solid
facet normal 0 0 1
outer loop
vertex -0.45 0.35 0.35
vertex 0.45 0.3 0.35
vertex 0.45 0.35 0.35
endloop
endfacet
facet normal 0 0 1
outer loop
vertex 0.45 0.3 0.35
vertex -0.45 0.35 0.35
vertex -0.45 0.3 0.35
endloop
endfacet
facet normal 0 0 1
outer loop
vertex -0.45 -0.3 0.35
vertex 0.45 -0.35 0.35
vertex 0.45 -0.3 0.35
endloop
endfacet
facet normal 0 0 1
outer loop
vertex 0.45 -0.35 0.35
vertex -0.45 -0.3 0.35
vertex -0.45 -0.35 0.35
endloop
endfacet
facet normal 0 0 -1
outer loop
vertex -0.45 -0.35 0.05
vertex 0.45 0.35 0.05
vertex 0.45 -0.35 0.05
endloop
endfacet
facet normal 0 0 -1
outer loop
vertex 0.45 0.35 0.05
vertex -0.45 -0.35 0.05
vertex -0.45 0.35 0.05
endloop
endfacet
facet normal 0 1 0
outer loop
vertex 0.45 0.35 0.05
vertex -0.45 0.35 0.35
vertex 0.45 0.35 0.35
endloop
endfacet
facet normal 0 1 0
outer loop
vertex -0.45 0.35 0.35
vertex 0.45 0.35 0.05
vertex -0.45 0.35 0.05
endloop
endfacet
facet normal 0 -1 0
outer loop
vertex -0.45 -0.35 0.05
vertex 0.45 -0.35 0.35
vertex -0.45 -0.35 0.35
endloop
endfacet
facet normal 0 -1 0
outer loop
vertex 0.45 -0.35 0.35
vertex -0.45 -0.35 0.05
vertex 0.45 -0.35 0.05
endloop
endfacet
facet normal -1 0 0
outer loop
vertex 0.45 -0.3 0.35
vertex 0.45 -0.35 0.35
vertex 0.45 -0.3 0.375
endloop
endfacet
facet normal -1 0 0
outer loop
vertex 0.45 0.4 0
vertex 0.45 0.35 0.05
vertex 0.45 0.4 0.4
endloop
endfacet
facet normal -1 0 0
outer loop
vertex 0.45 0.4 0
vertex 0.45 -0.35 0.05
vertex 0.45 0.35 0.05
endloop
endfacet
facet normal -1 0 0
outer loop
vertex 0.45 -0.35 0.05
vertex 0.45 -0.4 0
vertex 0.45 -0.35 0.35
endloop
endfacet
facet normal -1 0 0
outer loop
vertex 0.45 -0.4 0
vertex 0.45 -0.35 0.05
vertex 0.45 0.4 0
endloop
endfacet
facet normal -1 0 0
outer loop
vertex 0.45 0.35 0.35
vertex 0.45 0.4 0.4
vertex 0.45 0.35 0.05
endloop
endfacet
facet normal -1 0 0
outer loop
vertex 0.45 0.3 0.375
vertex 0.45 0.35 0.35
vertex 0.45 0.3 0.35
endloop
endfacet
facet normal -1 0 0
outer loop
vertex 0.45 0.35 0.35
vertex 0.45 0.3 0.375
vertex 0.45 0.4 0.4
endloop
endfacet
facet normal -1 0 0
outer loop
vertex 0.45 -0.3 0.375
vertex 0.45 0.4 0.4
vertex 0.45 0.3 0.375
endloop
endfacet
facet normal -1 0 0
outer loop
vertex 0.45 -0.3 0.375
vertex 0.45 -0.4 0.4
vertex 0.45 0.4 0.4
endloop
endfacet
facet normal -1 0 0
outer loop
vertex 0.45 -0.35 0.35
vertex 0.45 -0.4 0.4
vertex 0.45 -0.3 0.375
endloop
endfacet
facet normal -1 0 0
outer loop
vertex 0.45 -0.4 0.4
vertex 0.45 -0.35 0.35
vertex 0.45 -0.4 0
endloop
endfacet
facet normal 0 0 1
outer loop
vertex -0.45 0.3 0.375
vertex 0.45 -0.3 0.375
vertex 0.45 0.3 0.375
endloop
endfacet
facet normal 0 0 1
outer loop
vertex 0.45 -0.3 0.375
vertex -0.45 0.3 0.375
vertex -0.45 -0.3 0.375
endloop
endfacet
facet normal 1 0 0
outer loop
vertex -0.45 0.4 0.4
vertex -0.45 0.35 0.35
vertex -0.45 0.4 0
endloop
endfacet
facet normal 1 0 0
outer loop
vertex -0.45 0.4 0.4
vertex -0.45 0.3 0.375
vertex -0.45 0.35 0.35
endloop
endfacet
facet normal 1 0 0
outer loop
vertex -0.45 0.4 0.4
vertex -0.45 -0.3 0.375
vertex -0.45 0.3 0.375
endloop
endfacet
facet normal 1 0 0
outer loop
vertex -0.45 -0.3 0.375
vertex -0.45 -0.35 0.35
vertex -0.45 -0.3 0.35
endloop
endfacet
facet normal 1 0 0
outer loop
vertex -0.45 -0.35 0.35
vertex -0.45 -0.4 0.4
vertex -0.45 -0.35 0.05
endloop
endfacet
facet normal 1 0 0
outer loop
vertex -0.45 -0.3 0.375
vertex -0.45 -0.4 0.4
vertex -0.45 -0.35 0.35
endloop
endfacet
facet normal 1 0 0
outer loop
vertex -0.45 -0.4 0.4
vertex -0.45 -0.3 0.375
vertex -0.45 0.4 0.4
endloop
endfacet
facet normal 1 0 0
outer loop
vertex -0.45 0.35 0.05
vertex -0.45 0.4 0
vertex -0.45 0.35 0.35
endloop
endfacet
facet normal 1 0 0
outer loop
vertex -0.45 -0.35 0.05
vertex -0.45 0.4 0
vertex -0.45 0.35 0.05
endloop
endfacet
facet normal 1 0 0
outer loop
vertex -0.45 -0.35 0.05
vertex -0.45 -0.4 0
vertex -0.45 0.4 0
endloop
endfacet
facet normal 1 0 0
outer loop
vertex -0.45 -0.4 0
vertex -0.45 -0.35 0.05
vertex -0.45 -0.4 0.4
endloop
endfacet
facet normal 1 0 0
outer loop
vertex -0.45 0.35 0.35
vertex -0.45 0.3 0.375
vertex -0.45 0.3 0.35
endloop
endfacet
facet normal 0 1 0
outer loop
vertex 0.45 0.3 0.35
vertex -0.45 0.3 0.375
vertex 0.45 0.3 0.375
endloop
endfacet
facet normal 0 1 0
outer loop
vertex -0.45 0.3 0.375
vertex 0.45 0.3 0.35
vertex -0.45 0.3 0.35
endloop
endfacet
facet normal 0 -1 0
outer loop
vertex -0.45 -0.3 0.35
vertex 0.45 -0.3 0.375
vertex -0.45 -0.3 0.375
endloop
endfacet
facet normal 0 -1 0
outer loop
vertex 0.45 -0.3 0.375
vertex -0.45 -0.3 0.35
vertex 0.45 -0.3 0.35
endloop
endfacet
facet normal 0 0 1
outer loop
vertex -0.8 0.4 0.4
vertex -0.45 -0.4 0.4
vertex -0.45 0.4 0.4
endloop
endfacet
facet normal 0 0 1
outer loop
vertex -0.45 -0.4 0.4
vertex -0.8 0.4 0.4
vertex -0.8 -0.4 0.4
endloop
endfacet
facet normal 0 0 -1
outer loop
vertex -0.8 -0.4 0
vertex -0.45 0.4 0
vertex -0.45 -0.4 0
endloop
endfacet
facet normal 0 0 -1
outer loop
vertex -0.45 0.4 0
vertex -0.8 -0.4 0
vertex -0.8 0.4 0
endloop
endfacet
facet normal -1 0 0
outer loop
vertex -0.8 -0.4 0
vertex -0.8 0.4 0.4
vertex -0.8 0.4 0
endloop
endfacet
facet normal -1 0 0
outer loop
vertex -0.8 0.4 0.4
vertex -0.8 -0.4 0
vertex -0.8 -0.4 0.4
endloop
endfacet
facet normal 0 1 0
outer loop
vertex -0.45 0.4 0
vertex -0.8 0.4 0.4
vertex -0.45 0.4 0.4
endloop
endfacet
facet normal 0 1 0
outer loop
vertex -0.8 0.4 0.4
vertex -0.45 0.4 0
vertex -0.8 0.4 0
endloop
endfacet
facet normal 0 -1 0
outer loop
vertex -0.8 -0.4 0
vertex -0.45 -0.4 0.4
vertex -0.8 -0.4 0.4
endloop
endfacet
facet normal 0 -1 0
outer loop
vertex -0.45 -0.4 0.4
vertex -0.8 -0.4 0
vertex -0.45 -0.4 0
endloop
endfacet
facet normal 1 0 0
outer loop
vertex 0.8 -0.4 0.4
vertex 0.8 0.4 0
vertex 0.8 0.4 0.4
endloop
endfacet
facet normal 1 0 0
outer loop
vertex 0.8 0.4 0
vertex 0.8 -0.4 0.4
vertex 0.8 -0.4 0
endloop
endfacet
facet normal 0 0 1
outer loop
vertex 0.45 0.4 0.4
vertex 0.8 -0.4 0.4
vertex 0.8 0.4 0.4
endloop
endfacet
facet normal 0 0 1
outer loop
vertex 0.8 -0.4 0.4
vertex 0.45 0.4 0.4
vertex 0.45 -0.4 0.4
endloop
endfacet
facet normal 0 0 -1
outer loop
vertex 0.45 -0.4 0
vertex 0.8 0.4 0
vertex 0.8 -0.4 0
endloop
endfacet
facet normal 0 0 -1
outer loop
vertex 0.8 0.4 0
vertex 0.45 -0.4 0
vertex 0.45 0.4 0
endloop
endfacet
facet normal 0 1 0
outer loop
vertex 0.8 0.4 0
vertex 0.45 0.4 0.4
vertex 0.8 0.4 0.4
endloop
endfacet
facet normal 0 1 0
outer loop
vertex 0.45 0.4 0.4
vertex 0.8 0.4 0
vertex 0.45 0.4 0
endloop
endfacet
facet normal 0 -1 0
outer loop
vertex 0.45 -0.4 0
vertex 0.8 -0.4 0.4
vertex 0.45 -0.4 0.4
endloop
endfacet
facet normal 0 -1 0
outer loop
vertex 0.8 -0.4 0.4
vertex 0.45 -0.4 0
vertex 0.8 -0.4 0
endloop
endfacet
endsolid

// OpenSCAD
// file: proto/chip-r.scad
/*
OpenSCAD Model:  chip resistor

  L  - body length
  T  - pad length
  W  - width
  H  - height
  padcolor - color of metal leads
  bodycolor - color of body
  topcolor - color body top
  simple - 0 = realistic model, 1 = simplified model
*/

module chip_r(
	L=2.05,
	T=0.35,
	W=1.25,
	H=0.50,
	padcolor=[0.9,0.9,0.9],
	bodycolor=[1,1,0.9],
	topcolor=[0.0,0.0,0.0],
	labelcolor=[1,1,1],
	label="330",
	simple=1
) {

	module chippad() {
		if (simple) {
			color(padcolor)cube([T,W,H],center=true);
		} else {
			color(padcolor) union () {
				cube([T-0.1,W-0.1,H    ],center=true);
				cube([T-0.1,W    ,H-0.1],center=true);
				cube([T    ,W-0.1,H-0.1],center=true);
				translate([-T/2+0.05,-W/2+0.05,0]) cylinder(r=0.05,h=H-0.1,$fn=30,center=true);
				translate([T/2-0.05,-W/2+0.05,0]) cylinder(r=0.05,h=H-0.1,$fn=30,center=true);
				translate([-T/2+0.05,W/2-0.05,0]) cylinder(r=0.05,h=H-0.1,$fn=30,center=true);
				translate([T/2-0.05,W/2-0.05,0]) cylinder(r=0.05,h=H-0.1,$fn=30,center=true);
				translate([-T/2+0.05,0,H/2-0.05]) rotate(90,[1,0,0])cylinder(r=0.05,h=W-0.1,$fn=30,center=true);
				translate([T/2-0.05,0,H/2-0.05]) rotate(90,[1,0,0])cylinder(r=0.05,h=W-0.1,$fn=30,center=true);
				translate([-T/2+0.05,0,-H/2+0.05]) rotate(90,[1,0,0])cylinder(r=0.05,h=W-0.1,$fn=30,center=true);
				translate([T/2-0.05,0,-H/2+0.05]) rotate(90,[1,0,0])cylinder(r=0.05,h=W-0.1,$fn=30,center=true);
				translate([0,-W/2+0.05,H/2-0.05]) rotate(90,[0,1,0])cylinder(r=0.05,h=T-0.1,$fn=30,center=true);
				translate([0,W/2-0.05,H/2-0.05]) rotate(90,[0,1,0])cylinder(r=0.05,h=T-0.1,$fn=30,center=true);
				translate([0,-W/2+0.05,-H/2+0.05]) rotate(90,[0,1,0])cylinder(r=0.05,h=T-0.1,$fn=30,center=true);
				translate([0,W/2-0.05,-H/2+0.05]) rotate(90,[0,1,0])cylinder(r=0.05,h=T-0.1,$fn=30,center=true);
				translate([-T/2+0.05,-W/2+0.05,-H/2+0.05]) sphere(r=0.05, $fn=30);
				translate([-T/2+0.05,-W/2+0.05,H/2-0.05]) sphere(r=0.05, $fn=30);
				translate([T/2-0.05,-W/2+0.05,-H/2+0.05]) sphere(r=0.05, $fn=30);
				translate([T/2-0.05,-W/2+0.05,H/2-0.05]) sphere(r=0.05, $fn=30);
				translate([-T/2+0.05,W/2-0.05,-H/2+0.05]) sphere(r=0.05, $fn=30);
				translate([-T/2+0.05,W/2-0.05,H/2-0.05]) sphere(r=0.05, $fn=30);
				translate([T/2-0.05,W/2-0.05,-H/2+0.05]) sphere(r=0.05, $fn=30);
				translate([T/2-0.05,W/2-0.05,H/2-0.05]) sphere(r=0.05, $fn=30);
			}
		}
	}
	color(bodycolor) translate([0,0,H/2.]) cube([L-2*T+0.1,W-0.1,H-0.1],center=true);
	color(topcolor) translate([0,0,H-0.05]) cube([L-2*T,W-0.2,0.05],center=true);
	translate ([-L/2.+T/2.,0,H/2.]) chippad();
	translate ([L/2.-T/2.,0,H/2.]) chippad();
}
// main file
include<proto/chip-r.scad>

chip_r (
	L=1.6,
	T=0.35,
	W=0.8,
	H=0.40
);
